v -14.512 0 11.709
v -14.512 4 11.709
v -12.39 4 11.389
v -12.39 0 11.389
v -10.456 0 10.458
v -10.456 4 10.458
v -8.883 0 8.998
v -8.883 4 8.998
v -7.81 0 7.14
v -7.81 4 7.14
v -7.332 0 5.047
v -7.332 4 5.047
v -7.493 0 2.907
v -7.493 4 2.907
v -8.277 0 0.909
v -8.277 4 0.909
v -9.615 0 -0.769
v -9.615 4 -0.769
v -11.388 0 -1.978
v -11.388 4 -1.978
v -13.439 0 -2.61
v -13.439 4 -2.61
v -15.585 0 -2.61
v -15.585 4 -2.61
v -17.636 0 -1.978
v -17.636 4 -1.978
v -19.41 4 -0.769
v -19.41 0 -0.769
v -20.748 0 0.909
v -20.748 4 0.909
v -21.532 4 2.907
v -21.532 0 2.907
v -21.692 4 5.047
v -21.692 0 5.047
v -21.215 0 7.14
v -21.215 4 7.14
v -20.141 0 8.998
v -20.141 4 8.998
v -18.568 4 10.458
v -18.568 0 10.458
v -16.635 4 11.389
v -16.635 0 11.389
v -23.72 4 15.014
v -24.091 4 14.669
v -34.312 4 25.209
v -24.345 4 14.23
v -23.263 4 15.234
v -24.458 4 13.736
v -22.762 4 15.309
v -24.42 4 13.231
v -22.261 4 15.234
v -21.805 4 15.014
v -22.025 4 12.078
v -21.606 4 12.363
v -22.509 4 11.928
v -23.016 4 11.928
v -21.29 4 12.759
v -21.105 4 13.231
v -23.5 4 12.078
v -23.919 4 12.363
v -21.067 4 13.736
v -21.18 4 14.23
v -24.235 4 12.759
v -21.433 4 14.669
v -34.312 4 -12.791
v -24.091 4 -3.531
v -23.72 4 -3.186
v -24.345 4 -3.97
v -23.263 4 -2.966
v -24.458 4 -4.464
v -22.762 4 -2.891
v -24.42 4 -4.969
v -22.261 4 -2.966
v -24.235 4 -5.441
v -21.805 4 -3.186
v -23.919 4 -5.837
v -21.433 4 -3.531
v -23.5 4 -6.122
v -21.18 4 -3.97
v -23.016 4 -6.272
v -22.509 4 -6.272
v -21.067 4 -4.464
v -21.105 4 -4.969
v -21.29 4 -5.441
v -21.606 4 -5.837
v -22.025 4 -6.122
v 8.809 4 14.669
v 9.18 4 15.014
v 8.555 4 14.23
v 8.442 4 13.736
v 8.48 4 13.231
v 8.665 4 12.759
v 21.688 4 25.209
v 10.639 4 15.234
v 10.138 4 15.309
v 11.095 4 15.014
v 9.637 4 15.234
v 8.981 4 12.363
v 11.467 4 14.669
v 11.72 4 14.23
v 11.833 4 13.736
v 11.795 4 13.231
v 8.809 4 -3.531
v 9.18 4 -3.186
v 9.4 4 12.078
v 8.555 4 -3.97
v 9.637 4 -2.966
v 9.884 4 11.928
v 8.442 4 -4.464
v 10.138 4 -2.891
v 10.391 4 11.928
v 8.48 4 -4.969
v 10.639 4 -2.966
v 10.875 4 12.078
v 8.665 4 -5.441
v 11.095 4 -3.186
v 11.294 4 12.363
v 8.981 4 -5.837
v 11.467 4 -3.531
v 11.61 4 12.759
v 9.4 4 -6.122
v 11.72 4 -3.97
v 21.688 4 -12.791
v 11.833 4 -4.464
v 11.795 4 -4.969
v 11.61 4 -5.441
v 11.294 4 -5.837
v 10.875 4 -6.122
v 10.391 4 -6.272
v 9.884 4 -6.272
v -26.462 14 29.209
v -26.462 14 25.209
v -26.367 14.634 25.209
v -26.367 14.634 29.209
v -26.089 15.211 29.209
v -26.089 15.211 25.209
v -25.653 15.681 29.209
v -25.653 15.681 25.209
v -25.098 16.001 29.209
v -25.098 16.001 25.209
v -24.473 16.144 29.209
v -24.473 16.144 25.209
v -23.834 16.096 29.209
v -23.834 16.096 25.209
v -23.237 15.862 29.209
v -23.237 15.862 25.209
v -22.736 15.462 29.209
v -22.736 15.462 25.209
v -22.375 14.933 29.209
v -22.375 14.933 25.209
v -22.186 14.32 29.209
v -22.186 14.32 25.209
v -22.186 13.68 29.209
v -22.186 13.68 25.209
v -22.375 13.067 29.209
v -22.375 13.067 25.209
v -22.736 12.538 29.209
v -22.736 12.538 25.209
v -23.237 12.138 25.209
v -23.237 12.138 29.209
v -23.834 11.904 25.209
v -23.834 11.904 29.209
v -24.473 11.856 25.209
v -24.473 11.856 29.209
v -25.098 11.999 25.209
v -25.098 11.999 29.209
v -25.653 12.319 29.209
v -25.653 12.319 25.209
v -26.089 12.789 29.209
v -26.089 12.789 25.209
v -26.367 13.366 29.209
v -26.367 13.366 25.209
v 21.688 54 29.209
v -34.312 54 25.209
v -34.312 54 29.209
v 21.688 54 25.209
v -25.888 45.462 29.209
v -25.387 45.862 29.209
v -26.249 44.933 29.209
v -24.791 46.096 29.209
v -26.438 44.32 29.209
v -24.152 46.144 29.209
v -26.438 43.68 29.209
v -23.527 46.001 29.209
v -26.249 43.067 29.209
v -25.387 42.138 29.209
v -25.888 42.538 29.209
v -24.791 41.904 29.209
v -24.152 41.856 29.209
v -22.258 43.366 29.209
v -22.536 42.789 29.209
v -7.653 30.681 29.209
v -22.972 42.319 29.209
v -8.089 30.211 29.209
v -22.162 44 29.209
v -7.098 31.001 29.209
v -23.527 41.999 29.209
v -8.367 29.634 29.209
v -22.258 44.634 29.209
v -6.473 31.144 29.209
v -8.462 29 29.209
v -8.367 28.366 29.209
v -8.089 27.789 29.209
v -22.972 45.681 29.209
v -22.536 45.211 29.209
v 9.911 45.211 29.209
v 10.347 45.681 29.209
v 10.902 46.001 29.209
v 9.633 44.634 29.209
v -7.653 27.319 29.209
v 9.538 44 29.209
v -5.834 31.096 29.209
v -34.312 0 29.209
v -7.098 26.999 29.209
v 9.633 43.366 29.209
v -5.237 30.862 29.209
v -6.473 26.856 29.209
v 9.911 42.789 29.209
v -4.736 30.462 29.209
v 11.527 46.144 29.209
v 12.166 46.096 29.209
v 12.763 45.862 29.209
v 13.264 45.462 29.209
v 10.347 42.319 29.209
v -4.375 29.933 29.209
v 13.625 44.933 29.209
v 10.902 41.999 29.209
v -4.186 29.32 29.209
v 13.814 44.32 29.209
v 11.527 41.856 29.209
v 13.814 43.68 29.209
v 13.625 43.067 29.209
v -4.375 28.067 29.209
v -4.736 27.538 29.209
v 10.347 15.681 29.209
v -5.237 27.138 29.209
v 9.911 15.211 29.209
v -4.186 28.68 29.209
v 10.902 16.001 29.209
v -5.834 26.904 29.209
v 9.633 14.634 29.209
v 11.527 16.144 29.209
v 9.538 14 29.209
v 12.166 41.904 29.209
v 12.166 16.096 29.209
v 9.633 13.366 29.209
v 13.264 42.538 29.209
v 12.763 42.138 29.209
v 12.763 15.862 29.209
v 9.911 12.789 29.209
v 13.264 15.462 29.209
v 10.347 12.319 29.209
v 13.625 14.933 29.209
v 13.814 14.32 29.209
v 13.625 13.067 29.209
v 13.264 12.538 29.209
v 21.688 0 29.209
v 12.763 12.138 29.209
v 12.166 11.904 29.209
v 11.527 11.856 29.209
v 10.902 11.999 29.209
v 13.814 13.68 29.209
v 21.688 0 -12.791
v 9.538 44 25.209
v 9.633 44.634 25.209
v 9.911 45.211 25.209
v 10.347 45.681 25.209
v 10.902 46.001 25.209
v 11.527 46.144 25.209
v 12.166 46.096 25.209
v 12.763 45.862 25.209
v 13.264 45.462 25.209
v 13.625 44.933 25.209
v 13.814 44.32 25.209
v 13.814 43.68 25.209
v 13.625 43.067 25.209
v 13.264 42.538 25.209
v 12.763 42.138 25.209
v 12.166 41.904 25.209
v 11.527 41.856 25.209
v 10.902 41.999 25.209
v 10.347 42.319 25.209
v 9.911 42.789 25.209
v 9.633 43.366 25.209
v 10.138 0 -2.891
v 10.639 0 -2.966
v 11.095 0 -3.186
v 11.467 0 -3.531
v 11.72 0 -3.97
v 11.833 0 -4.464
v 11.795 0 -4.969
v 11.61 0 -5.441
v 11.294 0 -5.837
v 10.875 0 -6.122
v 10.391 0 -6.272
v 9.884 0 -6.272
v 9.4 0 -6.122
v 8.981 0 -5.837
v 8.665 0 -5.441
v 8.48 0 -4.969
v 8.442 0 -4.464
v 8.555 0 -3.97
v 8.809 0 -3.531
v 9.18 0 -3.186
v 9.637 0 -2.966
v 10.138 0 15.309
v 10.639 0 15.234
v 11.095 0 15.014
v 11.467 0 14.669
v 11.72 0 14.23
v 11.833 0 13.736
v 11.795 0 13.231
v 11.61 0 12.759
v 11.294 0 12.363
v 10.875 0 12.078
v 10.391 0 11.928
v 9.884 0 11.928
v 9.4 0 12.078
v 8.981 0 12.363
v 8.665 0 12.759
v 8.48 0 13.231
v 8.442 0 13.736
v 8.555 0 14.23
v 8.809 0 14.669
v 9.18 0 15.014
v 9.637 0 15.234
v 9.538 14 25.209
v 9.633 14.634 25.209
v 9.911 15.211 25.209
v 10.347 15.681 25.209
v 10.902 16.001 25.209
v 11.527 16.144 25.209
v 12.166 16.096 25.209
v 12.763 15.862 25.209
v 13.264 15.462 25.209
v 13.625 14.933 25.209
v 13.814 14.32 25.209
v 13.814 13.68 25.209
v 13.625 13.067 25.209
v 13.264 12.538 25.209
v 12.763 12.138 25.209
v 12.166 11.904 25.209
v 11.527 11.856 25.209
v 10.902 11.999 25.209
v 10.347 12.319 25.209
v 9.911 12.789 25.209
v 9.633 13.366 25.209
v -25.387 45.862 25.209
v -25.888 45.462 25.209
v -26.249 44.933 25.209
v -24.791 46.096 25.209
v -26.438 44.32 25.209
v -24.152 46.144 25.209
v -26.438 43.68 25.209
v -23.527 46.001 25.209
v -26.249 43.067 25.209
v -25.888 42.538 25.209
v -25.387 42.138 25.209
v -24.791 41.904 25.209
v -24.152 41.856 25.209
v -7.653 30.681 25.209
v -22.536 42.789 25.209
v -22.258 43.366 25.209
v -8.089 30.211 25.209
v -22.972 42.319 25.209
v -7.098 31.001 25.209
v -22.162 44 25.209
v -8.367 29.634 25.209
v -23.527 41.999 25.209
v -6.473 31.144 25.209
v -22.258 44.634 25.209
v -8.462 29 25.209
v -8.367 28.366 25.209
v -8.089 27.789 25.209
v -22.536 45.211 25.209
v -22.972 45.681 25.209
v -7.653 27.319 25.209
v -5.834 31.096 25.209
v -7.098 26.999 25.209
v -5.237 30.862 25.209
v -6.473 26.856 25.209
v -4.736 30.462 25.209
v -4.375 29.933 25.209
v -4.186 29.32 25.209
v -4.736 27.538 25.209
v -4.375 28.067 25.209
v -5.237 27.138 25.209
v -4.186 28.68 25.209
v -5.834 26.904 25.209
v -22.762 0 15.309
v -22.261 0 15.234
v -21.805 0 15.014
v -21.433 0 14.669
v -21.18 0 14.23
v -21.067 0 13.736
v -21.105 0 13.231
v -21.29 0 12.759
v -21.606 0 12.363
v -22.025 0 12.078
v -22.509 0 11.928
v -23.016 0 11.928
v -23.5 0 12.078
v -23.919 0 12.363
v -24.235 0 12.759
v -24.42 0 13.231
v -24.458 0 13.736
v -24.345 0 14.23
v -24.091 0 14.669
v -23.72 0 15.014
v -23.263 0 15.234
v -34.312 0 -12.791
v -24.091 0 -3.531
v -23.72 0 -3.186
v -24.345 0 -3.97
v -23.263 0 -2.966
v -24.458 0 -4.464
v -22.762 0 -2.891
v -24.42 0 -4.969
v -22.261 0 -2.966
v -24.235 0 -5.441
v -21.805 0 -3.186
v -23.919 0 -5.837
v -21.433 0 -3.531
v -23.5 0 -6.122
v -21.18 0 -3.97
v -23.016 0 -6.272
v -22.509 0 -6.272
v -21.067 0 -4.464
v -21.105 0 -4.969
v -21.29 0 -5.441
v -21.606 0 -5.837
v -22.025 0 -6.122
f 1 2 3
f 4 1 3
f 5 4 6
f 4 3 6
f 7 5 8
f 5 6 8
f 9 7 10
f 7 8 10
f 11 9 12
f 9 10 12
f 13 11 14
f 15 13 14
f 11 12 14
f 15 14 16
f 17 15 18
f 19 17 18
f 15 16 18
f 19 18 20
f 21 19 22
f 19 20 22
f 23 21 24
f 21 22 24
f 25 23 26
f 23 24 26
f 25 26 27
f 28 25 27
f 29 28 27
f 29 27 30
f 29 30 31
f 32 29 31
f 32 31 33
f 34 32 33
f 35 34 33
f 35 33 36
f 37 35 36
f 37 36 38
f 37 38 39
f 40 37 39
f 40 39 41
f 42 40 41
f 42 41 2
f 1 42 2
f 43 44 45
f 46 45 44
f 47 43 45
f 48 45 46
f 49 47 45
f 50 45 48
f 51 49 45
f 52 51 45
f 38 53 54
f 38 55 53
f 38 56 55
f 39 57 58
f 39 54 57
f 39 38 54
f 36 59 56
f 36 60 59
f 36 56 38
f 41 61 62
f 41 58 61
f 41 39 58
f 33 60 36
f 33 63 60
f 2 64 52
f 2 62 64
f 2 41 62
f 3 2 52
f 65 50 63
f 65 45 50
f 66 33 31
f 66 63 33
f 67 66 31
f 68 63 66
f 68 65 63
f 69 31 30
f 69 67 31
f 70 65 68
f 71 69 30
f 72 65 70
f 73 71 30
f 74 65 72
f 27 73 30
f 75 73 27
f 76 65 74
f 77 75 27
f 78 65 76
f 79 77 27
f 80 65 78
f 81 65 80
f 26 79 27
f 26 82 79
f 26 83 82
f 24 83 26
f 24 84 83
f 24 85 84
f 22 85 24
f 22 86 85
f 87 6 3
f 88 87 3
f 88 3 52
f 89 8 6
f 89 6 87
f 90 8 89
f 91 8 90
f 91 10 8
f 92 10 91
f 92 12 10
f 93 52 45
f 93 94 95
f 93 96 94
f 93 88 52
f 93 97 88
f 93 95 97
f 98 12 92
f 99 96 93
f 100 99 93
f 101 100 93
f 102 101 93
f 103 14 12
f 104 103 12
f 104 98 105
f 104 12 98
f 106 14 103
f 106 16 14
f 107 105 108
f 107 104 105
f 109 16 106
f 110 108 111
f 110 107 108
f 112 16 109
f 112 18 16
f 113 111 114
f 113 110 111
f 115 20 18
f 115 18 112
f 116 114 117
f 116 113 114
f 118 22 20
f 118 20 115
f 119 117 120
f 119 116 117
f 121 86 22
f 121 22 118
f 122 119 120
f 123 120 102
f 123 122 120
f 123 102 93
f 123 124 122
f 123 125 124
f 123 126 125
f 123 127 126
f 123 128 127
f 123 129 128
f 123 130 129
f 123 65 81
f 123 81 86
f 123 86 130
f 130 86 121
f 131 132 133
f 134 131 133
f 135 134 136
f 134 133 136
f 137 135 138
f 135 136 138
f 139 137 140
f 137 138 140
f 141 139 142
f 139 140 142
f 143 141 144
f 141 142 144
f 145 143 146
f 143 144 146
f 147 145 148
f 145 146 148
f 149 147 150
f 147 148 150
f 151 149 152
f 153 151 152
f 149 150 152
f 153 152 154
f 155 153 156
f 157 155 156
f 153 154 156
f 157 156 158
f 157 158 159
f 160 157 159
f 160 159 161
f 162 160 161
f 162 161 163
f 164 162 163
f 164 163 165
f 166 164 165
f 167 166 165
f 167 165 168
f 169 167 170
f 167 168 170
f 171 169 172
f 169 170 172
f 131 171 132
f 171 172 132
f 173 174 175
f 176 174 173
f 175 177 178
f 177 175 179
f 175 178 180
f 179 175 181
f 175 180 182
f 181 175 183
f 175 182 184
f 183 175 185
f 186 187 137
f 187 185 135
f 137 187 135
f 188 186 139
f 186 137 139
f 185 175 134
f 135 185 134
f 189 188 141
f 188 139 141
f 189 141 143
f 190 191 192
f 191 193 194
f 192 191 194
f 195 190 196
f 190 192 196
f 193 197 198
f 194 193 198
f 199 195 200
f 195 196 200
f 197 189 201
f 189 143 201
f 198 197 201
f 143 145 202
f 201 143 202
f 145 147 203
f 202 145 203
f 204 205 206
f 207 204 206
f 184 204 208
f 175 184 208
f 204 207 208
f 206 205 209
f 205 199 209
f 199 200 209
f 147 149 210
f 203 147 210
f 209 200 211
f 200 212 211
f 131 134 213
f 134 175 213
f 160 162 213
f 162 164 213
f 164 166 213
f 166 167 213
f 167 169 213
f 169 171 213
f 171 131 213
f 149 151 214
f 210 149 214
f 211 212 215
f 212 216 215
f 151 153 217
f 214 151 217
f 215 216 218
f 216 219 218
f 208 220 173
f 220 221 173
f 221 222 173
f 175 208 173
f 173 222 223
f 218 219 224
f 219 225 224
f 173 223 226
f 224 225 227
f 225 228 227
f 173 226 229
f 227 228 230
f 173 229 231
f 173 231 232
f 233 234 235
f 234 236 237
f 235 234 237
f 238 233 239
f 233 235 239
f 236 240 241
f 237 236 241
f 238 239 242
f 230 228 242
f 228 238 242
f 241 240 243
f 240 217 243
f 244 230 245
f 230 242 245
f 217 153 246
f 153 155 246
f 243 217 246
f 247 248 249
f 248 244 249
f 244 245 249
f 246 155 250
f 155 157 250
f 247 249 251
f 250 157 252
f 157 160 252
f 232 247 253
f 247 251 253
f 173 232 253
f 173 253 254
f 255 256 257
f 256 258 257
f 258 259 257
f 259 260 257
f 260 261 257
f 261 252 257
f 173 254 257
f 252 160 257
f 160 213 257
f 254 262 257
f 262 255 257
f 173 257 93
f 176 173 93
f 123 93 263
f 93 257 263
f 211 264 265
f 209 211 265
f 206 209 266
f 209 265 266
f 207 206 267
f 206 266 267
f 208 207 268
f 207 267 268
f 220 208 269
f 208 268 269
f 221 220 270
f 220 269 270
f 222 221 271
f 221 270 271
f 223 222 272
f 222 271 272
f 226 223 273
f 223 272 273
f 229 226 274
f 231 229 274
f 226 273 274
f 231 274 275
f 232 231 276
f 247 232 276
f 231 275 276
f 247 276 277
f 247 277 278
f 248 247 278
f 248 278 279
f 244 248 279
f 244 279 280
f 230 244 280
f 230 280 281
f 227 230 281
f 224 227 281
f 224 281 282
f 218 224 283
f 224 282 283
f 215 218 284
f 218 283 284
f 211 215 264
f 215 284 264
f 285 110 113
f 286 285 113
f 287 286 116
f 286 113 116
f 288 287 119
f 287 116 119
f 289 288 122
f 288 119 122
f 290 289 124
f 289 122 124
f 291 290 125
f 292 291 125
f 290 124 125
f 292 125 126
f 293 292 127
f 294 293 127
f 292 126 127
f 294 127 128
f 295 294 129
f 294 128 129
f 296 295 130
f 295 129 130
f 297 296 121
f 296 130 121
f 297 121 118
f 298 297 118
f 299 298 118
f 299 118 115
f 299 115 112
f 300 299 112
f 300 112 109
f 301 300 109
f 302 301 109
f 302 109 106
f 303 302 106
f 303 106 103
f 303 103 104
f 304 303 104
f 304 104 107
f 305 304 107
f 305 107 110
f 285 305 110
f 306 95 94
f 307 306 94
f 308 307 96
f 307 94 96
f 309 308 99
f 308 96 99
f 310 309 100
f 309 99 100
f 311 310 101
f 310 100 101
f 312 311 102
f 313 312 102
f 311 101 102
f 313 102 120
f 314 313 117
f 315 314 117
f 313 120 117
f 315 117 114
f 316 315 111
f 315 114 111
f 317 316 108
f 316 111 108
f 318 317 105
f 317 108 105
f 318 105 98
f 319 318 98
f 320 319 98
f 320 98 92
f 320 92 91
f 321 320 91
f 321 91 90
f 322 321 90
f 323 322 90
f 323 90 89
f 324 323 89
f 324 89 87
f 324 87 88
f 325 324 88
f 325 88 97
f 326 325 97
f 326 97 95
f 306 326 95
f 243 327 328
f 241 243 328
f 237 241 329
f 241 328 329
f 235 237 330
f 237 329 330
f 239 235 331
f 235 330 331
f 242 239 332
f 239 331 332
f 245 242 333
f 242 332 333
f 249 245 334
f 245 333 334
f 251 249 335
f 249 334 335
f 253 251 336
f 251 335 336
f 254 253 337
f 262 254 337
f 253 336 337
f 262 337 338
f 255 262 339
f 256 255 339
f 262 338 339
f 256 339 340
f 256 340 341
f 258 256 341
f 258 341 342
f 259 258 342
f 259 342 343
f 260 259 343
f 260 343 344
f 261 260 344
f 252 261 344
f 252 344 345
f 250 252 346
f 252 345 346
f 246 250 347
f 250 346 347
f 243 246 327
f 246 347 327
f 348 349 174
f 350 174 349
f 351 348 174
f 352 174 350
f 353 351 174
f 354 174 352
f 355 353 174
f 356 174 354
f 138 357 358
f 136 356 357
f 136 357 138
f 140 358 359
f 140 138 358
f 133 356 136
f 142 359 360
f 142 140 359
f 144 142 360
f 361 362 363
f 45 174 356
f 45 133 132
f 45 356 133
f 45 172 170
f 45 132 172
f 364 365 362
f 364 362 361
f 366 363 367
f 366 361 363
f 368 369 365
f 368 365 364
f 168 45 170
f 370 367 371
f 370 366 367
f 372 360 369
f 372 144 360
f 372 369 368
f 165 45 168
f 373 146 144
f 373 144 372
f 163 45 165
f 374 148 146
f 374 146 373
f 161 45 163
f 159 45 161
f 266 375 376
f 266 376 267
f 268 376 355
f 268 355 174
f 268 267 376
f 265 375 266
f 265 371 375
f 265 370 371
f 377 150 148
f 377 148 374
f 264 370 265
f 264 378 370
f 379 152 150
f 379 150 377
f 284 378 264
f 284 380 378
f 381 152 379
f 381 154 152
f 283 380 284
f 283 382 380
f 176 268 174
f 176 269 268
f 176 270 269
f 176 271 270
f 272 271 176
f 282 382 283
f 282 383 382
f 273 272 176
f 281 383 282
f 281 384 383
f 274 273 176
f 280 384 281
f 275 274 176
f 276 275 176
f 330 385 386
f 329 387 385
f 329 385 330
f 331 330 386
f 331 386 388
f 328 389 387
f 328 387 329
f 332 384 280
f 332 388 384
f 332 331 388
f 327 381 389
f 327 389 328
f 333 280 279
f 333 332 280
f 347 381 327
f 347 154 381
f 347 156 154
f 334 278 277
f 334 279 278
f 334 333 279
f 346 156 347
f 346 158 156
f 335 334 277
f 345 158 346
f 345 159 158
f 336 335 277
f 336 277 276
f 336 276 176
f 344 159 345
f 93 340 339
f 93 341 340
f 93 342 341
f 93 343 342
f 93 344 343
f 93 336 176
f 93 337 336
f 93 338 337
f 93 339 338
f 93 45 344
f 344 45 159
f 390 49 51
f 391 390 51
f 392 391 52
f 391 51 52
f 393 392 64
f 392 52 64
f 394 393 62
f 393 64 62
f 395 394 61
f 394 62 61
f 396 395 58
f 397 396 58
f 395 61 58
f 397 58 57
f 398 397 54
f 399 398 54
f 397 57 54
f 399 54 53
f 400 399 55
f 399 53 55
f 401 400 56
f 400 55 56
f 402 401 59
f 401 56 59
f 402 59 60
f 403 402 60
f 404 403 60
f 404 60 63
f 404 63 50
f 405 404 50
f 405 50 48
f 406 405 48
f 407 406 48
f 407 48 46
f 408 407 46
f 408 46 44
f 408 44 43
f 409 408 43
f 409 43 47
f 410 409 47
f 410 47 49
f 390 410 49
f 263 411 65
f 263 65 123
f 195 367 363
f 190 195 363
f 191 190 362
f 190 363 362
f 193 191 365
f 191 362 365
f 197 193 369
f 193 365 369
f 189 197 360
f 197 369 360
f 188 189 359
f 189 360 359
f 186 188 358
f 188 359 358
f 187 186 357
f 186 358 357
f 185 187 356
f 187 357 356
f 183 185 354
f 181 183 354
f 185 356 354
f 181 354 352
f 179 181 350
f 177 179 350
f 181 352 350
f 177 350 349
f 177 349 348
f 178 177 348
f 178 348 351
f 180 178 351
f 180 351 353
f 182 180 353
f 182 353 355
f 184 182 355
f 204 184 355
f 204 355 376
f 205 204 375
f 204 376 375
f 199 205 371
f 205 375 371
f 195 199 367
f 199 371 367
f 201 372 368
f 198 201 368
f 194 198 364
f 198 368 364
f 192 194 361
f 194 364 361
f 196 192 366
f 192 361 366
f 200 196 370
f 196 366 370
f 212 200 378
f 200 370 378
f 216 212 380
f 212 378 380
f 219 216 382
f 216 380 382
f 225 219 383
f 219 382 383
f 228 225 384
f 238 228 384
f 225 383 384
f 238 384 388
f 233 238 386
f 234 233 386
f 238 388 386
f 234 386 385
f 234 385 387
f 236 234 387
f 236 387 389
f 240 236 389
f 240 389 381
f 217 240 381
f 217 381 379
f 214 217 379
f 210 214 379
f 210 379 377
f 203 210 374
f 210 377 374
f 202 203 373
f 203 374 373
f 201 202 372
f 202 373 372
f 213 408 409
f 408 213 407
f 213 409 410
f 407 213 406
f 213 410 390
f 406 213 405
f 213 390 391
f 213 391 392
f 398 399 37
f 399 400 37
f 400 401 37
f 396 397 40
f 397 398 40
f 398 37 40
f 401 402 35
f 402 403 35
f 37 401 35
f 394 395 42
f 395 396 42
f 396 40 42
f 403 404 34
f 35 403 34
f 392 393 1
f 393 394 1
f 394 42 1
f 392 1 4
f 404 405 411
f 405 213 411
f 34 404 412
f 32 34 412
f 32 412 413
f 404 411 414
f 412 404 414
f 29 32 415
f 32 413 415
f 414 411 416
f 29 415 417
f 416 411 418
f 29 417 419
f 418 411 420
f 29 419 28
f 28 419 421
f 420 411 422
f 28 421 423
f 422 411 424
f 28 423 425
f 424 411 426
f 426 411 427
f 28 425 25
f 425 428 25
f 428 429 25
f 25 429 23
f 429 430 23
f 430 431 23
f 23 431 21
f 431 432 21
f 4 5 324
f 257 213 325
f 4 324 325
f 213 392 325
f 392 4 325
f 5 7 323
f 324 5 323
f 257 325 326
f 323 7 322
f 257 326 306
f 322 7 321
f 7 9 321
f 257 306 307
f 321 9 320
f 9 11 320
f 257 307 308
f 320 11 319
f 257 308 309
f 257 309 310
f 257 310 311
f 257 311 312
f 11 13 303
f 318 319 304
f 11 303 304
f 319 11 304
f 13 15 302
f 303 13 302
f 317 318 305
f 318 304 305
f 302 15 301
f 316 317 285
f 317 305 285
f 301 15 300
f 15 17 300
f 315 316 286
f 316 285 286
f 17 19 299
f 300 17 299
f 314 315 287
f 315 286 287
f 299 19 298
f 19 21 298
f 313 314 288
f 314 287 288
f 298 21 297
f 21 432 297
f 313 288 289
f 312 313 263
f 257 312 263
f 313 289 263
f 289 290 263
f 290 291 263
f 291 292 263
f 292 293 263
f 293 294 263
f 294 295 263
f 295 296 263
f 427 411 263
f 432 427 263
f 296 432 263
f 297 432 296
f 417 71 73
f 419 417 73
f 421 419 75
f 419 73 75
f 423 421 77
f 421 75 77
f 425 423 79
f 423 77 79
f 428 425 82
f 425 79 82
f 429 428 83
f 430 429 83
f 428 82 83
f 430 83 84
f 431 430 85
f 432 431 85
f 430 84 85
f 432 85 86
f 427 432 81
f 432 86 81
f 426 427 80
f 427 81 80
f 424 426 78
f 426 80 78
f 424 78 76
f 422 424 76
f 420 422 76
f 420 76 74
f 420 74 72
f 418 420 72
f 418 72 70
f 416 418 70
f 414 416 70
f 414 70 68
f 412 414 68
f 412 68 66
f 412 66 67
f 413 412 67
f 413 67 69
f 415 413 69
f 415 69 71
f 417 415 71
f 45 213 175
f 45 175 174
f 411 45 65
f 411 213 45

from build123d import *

# Parameters (mm, degrees)
SKETCH_2_W          = 56
SKETCH_2_H          = 4
EXTRUDE_1_DEPTH     = 54
SKETCH_2_3_W        = 56
SKETCH_2_3_H        = 38
EXTRUDE_2_DEPTH     = 4
SKETCH_3_R          = 2.15
CUT_EXTRUDE_1_DEPTH = 4
SKETCH_4_R          = 1.7
SKETCH_4_R_2        = 7.2
CUT_EXTRUDE_3_DEPTH = 10


with BuildPart() as part:
    # 草图2 → 凸台-拉伸1 (new body)
    with BuildSketch(Plane(origin=(0, 0, 0), x_dir=(1, 0, 0), z_dir=(0, 1, 0))):
        with Locations((-6.312292359, -27.209302326)):
            Rectangle(SKETCH_2_W, SKETCH_2_H)
    extrude(amount=EXTRUDE_1_DEPTH)

    # 草图2<3> → 凸台-拉伸2 (add)
    with BuildSketch(Plane(origin=(0, 0, 0), x_dir=(1, 0, 0), z_dir=(0, 1, 0))):
        with Locations((-6.312292359, -6.209302326)):
            Rectangle(SKETCH_2_3_W, SKETCH_2_3_H)
    extrude(amount=EXTRUDE_2_DEPTH)

    # 草图3 → 切除-拉伸1 (cut)
    with BuildSketch(Plane(origin=(0, 0, 25.209302326), x_dir=(-1, 0, 0), z_dir=(0, 0, -1))):
        with Locations((6.312292359, 29)):
            Circle(SKETCH_3_R)
        with Locations((-11.687707641, 44)):
            Circle(SKETCH_3_R)
        with Locations((24.312292359, 44)):
            Circle(SKETCH_3_R)
        with Locations((24.312292359, 14)):
            Circle(SKETCH_3_R)
        with Locations((-11.687707641, 14)):
            Circle(SKETCH_3_R)
    extrude(amount=-CUT_EXTRUDE_1_DEPTH, mode=Mode.SUBTRACT)

    # 草图4 → 切除-拉伸3 (cut)
    with BuildSketch(Plane(origin=(0, 4, 0), x_dir=(1, 0, 0), z_dir=(0, 1, 0))):
        with Locations((-22.762292359, -13.609302326)):
            Circle(SKETCH_4_R)
        with Locations((-22.762292359, 4.590697674)):
            Circle(SKETCH_4_R)
        with Locations((-14.512292359, -4.509302326)):
            Circle(SKETCH_4_R_2)
        with Locations((10.137707641, 4.590697674)):
            Circle(SKETCH_4_R)
        with Locations((10.137707641, -13.609302326)):
            Circle(SKETCH_4_R)
    extrude(amount=-CUT_EXTRUDE_3_DEPTH, mode=Mode.SUBTRACT)


solid = part.part
